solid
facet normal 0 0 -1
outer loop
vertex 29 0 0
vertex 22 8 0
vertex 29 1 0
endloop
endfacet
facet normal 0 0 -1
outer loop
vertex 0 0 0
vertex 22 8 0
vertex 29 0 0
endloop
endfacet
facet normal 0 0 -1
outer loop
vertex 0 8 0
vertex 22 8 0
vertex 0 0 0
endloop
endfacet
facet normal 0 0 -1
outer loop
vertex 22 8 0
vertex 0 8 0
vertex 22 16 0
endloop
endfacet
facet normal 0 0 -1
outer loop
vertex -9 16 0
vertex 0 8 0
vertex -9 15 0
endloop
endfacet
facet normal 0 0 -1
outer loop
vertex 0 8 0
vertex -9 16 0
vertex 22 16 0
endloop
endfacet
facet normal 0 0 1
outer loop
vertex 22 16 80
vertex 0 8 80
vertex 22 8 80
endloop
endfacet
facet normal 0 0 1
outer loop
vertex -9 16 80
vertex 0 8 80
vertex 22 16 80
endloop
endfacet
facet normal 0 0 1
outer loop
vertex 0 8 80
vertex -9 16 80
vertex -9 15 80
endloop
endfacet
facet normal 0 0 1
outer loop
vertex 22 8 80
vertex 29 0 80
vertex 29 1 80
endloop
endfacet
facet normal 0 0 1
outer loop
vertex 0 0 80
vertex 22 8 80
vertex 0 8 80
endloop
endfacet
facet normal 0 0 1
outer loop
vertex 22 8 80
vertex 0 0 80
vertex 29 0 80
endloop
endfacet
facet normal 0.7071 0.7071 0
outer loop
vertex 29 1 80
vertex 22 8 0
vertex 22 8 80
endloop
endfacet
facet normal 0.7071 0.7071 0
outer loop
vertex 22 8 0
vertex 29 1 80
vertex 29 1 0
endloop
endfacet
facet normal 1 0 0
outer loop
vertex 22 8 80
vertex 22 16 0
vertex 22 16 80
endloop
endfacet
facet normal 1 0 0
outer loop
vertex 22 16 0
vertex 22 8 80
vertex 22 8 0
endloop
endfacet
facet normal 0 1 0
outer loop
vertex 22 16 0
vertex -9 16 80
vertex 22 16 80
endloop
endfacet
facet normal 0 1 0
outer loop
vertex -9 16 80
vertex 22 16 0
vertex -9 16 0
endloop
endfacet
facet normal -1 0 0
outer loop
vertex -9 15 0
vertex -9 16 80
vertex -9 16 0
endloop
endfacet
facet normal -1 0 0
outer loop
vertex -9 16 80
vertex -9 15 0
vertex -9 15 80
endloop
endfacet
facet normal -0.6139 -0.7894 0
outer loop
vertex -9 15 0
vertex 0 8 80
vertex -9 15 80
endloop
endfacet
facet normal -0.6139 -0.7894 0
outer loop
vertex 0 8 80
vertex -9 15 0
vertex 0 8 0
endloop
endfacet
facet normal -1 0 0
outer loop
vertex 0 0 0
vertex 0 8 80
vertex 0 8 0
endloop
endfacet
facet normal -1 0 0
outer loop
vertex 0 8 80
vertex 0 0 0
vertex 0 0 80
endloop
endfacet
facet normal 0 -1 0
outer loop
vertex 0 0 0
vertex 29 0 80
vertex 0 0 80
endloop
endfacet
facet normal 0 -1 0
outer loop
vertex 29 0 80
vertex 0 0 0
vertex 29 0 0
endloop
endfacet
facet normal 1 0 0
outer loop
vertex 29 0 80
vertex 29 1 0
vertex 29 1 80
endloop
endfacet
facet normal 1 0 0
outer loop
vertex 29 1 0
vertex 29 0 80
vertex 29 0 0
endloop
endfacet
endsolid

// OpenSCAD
Length = 80;
Layer_height = 0.2;
Chamfer = 8;
Straight = 8;
Height = 30;
Edge = 1;

color("beige") linear_extrude(Length) {
    polygon(
      [
        [0, 0],
        [Height - Edge, 0],
        [Height - Edge, Edge],
        [Height - Chamfer, Chamfer],
        [Height - Chamfer, Straight + Chamfer],
        [-Chamfer - Edge, Straight + Chamfer],
        [-Chamfer - Edge, Straight + Chamfer - Edge],
        [0, Straight],
      ]
    );
  }

color("gray") {
  rotate([90, 90, 0]) translate([-Length / 2, Height * 0.55, -Layer_height]) linear_extrude(Layer_height) {
        text("Čisto", halign="center", valign="center", size=12, font="Liberation Sans");
      }
}

color("lightblue") {
  rotate([90, 90, 0]) translate([-Length / 2, Height / 2, -Layer_height]) linear_extrude(Layer_height) {
        text("\x47            \x47", halign="center", valign="center", size=10, font="Zapf Dingbats");
      }
}

color("gray") {
  rotate([90, 90, 180]) translate([-Length / 2, Chamfer - Height * 0.45, Straight + Chamfer - Layer_height])
      linear_extrude(Layer_height) {
        text("Umazano", halign="center", valign="center", size=12);
      }
}
